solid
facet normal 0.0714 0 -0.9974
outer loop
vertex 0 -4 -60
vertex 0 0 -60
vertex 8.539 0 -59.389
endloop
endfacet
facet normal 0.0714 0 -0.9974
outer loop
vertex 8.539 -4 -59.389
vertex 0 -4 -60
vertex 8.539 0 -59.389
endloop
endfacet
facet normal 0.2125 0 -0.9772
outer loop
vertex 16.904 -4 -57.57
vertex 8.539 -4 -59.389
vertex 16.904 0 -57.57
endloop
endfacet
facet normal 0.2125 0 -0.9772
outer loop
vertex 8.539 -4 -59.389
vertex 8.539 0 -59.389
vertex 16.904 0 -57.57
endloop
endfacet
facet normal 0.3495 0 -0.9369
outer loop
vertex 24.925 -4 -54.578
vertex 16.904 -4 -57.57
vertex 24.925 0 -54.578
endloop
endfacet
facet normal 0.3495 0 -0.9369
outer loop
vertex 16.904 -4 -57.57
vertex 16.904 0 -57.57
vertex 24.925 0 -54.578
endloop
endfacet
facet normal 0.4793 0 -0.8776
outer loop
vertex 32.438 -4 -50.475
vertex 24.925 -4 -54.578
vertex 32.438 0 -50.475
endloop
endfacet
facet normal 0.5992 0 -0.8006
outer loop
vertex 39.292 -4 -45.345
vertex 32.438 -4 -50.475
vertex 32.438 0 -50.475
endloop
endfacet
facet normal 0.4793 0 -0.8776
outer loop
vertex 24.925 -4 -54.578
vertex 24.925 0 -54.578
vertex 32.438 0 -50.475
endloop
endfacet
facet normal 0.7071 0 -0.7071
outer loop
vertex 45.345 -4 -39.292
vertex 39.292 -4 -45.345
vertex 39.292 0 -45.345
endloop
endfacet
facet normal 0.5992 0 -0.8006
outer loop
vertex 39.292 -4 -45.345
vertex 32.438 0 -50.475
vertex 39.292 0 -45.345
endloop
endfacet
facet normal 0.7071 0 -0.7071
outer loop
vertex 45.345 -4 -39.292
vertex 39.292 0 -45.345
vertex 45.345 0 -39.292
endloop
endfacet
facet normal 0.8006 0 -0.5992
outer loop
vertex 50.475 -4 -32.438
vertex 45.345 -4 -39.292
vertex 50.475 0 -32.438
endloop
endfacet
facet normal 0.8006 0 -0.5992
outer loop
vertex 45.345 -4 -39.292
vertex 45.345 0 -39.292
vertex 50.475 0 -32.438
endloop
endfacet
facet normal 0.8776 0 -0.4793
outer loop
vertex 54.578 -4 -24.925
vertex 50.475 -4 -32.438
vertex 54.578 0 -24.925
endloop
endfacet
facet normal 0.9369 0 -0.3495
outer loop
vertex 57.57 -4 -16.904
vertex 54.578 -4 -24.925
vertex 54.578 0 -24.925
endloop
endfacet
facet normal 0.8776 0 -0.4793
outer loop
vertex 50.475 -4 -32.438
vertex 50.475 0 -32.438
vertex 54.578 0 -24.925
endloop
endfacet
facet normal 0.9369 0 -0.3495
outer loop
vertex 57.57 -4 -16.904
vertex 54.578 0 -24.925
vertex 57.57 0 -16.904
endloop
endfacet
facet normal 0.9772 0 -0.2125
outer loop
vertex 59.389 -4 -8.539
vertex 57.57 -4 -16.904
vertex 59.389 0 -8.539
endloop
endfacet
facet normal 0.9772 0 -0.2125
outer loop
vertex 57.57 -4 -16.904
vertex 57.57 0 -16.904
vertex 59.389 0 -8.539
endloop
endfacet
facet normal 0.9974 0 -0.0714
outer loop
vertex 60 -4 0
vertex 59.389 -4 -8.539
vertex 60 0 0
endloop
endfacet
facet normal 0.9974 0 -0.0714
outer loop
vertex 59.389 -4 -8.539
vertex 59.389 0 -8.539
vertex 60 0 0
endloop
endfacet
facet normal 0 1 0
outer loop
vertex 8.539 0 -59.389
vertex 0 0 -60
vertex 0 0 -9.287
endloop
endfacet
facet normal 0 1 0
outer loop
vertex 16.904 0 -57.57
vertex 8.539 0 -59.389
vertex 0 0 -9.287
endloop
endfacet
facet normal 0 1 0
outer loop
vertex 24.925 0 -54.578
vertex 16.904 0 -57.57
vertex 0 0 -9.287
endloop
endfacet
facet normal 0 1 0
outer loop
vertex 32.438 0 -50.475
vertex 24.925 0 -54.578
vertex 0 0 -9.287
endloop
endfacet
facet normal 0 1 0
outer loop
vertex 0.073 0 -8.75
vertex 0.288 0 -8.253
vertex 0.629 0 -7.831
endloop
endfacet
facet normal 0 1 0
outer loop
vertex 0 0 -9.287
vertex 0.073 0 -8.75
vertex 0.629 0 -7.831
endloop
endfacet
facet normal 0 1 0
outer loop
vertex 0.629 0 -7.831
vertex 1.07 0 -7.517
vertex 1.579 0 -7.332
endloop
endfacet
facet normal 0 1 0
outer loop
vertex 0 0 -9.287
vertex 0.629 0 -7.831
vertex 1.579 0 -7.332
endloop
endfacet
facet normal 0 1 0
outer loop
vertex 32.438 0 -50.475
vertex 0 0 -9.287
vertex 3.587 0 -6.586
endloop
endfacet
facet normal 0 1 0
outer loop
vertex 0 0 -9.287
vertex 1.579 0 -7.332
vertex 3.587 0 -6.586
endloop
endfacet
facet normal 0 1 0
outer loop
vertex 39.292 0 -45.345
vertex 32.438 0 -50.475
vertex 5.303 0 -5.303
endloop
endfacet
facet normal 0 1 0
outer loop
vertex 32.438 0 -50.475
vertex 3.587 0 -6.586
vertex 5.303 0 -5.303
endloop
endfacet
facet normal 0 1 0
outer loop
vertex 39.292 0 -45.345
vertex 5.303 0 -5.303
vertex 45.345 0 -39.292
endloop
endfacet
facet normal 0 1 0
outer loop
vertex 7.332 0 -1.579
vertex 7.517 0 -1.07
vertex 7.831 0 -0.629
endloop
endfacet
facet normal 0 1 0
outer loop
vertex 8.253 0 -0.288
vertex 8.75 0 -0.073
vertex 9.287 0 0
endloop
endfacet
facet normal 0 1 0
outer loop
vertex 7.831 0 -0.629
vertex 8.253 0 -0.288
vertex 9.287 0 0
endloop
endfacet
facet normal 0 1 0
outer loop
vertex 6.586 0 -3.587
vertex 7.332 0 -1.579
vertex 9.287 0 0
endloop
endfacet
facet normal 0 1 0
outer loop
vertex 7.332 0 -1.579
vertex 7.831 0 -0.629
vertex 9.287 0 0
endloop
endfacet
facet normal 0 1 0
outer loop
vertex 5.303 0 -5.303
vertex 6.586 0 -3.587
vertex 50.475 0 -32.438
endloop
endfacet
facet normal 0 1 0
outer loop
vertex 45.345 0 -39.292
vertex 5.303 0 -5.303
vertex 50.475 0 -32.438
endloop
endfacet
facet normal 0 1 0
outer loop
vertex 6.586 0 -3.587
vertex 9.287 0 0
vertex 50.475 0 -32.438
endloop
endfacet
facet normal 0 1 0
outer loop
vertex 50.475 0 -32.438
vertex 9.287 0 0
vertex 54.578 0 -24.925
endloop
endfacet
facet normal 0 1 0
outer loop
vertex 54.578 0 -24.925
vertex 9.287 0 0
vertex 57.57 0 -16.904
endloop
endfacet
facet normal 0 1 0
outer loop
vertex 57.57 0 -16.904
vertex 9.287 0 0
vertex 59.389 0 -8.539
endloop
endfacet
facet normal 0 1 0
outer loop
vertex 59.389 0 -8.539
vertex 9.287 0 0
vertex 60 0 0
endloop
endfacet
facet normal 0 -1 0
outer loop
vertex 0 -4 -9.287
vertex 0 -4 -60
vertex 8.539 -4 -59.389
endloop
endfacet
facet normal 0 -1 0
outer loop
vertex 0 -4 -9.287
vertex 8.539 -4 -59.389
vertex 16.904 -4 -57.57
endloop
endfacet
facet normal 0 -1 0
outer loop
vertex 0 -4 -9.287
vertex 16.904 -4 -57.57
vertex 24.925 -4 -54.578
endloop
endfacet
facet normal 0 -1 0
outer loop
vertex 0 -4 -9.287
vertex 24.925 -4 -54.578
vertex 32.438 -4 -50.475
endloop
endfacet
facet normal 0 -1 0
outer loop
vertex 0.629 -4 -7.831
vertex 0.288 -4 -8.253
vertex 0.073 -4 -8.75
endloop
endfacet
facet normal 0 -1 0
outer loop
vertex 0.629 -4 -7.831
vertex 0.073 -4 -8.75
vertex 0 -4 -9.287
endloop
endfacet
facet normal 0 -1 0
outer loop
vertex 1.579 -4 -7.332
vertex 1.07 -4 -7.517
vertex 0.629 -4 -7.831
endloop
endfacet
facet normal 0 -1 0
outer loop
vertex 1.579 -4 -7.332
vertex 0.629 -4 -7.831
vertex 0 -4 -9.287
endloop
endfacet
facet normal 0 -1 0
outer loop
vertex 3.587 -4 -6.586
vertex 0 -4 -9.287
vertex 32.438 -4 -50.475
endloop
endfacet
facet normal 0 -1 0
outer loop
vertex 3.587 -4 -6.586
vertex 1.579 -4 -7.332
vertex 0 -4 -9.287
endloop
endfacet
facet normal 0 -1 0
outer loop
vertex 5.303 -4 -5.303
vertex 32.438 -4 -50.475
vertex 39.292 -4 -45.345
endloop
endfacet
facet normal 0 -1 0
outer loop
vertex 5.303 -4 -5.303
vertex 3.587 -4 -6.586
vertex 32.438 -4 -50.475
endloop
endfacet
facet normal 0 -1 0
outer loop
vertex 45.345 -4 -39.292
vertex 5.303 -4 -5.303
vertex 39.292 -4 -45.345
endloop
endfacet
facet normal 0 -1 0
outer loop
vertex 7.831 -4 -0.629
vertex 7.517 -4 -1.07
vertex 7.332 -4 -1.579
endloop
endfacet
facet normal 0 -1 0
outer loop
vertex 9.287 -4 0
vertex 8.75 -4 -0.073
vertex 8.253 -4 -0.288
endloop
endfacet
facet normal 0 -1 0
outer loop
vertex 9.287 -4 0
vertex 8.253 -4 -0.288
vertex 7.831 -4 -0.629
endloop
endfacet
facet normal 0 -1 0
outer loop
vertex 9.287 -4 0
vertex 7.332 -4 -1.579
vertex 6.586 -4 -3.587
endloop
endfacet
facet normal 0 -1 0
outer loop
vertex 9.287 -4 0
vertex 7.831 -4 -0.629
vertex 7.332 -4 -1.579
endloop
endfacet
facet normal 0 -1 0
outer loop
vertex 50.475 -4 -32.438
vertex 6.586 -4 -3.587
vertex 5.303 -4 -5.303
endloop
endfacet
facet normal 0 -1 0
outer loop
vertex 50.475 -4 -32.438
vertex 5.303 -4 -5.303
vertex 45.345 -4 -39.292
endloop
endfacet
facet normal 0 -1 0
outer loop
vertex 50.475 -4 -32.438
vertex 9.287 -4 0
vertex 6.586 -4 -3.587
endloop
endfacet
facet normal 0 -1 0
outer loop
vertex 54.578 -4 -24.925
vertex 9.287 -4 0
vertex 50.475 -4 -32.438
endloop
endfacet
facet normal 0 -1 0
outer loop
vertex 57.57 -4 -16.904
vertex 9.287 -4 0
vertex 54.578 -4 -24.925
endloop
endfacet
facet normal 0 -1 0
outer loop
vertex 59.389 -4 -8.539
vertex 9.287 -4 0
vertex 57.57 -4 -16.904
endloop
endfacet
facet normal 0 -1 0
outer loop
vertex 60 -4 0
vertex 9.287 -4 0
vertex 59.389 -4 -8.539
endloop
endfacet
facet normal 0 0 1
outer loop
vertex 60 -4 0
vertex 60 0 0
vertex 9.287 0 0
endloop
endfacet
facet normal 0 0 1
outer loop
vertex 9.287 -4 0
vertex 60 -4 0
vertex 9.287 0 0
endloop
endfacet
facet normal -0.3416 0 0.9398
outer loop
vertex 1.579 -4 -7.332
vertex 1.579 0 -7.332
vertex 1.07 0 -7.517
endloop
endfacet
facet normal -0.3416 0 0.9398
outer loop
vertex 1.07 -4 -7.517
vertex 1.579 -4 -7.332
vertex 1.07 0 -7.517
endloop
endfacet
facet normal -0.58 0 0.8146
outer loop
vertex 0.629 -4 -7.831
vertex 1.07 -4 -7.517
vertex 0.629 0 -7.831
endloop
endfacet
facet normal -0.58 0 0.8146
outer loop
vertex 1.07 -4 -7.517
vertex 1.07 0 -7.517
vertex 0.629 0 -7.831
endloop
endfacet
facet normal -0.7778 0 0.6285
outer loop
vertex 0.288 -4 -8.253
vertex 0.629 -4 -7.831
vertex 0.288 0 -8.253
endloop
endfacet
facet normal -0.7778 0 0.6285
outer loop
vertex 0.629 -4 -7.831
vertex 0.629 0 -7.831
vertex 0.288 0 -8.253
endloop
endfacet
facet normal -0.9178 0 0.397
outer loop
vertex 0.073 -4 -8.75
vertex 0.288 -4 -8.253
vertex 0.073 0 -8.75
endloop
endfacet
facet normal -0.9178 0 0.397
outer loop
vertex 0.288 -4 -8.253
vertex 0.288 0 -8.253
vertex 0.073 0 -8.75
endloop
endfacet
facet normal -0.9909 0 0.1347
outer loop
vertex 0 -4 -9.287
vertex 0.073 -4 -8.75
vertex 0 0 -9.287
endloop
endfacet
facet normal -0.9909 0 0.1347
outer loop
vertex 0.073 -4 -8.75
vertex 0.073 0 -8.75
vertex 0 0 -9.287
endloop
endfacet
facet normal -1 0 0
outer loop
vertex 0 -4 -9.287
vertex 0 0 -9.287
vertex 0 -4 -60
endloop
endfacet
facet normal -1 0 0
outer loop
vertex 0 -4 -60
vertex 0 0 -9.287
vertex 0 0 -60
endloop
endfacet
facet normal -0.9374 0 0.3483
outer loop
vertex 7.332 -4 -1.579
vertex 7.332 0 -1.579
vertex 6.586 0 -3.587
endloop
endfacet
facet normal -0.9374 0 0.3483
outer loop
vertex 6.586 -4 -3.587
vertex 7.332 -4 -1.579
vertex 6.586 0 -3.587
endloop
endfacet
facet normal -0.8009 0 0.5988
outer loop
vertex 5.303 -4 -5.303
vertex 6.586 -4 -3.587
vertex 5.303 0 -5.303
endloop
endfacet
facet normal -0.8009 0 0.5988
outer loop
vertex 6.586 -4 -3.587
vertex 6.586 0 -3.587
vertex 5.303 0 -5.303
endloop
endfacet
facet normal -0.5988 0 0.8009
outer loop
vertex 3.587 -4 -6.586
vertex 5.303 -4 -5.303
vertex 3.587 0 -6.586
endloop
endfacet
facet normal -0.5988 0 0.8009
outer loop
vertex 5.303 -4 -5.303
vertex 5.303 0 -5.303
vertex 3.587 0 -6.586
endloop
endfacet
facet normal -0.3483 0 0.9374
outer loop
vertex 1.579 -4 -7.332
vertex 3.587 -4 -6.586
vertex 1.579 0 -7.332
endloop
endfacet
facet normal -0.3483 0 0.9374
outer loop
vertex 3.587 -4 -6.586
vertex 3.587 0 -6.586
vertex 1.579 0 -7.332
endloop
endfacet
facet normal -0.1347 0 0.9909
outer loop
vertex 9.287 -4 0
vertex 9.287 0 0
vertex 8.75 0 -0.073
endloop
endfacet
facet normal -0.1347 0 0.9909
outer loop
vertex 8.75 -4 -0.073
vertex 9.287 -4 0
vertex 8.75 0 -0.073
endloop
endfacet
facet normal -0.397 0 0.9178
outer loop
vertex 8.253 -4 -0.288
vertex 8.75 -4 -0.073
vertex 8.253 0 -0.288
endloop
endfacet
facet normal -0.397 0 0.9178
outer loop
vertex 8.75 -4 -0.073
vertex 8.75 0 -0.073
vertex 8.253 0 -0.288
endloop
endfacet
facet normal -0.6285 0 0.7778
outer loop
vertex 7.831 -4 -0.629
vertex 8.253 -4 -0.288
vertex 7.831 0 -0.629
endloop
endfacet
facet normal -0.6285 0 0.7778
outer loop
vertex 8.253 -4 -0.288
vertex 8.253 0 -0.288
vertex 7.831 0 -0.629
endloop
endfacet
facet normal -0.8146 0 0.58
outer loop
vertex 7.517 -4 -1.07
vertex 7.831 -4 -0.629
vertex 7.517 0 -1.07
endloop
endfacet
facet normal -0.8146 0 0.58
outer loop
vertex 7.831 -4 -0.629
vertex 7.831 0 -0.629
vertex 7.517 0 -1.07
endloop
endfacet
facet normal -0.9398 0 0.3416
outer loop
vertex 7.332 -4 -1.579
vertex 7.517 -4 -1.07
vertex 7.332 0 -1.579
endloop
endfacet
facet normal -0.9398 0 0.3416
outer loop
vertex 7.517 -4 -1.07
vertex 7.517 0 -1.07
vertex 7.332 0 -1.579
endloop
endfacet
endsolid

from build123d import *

# Parameters (mm, degrees)
F1_DEPTH = 4


with BuildPart() as f1:
    # F0 (on Front) → F1 (new body)
    with BuildSketch(Plane.XZ):
        with BuildLine():
            Line((60, 0), (9.287088, 0))
            ThreePointArc((9.287088, 0), (8.030526, -0.444027), (7.331911, -1.578947))
            ThreePointArc((7.331911, -1.578947), (5.303301, -5.303301), (1.578947, -7.331911))
            ThreePointArc((1.578947, -7.331911), (0.444027, -8.030526), (0, -9.287088))
            Line((0, -9.287088), (0, -60))
            ThreePointArc((0, -60), (42.426407, -42.426407), (60, 0))
        make_face()
    extrude(amount=F1_DEPTH)


solid = f1.part
